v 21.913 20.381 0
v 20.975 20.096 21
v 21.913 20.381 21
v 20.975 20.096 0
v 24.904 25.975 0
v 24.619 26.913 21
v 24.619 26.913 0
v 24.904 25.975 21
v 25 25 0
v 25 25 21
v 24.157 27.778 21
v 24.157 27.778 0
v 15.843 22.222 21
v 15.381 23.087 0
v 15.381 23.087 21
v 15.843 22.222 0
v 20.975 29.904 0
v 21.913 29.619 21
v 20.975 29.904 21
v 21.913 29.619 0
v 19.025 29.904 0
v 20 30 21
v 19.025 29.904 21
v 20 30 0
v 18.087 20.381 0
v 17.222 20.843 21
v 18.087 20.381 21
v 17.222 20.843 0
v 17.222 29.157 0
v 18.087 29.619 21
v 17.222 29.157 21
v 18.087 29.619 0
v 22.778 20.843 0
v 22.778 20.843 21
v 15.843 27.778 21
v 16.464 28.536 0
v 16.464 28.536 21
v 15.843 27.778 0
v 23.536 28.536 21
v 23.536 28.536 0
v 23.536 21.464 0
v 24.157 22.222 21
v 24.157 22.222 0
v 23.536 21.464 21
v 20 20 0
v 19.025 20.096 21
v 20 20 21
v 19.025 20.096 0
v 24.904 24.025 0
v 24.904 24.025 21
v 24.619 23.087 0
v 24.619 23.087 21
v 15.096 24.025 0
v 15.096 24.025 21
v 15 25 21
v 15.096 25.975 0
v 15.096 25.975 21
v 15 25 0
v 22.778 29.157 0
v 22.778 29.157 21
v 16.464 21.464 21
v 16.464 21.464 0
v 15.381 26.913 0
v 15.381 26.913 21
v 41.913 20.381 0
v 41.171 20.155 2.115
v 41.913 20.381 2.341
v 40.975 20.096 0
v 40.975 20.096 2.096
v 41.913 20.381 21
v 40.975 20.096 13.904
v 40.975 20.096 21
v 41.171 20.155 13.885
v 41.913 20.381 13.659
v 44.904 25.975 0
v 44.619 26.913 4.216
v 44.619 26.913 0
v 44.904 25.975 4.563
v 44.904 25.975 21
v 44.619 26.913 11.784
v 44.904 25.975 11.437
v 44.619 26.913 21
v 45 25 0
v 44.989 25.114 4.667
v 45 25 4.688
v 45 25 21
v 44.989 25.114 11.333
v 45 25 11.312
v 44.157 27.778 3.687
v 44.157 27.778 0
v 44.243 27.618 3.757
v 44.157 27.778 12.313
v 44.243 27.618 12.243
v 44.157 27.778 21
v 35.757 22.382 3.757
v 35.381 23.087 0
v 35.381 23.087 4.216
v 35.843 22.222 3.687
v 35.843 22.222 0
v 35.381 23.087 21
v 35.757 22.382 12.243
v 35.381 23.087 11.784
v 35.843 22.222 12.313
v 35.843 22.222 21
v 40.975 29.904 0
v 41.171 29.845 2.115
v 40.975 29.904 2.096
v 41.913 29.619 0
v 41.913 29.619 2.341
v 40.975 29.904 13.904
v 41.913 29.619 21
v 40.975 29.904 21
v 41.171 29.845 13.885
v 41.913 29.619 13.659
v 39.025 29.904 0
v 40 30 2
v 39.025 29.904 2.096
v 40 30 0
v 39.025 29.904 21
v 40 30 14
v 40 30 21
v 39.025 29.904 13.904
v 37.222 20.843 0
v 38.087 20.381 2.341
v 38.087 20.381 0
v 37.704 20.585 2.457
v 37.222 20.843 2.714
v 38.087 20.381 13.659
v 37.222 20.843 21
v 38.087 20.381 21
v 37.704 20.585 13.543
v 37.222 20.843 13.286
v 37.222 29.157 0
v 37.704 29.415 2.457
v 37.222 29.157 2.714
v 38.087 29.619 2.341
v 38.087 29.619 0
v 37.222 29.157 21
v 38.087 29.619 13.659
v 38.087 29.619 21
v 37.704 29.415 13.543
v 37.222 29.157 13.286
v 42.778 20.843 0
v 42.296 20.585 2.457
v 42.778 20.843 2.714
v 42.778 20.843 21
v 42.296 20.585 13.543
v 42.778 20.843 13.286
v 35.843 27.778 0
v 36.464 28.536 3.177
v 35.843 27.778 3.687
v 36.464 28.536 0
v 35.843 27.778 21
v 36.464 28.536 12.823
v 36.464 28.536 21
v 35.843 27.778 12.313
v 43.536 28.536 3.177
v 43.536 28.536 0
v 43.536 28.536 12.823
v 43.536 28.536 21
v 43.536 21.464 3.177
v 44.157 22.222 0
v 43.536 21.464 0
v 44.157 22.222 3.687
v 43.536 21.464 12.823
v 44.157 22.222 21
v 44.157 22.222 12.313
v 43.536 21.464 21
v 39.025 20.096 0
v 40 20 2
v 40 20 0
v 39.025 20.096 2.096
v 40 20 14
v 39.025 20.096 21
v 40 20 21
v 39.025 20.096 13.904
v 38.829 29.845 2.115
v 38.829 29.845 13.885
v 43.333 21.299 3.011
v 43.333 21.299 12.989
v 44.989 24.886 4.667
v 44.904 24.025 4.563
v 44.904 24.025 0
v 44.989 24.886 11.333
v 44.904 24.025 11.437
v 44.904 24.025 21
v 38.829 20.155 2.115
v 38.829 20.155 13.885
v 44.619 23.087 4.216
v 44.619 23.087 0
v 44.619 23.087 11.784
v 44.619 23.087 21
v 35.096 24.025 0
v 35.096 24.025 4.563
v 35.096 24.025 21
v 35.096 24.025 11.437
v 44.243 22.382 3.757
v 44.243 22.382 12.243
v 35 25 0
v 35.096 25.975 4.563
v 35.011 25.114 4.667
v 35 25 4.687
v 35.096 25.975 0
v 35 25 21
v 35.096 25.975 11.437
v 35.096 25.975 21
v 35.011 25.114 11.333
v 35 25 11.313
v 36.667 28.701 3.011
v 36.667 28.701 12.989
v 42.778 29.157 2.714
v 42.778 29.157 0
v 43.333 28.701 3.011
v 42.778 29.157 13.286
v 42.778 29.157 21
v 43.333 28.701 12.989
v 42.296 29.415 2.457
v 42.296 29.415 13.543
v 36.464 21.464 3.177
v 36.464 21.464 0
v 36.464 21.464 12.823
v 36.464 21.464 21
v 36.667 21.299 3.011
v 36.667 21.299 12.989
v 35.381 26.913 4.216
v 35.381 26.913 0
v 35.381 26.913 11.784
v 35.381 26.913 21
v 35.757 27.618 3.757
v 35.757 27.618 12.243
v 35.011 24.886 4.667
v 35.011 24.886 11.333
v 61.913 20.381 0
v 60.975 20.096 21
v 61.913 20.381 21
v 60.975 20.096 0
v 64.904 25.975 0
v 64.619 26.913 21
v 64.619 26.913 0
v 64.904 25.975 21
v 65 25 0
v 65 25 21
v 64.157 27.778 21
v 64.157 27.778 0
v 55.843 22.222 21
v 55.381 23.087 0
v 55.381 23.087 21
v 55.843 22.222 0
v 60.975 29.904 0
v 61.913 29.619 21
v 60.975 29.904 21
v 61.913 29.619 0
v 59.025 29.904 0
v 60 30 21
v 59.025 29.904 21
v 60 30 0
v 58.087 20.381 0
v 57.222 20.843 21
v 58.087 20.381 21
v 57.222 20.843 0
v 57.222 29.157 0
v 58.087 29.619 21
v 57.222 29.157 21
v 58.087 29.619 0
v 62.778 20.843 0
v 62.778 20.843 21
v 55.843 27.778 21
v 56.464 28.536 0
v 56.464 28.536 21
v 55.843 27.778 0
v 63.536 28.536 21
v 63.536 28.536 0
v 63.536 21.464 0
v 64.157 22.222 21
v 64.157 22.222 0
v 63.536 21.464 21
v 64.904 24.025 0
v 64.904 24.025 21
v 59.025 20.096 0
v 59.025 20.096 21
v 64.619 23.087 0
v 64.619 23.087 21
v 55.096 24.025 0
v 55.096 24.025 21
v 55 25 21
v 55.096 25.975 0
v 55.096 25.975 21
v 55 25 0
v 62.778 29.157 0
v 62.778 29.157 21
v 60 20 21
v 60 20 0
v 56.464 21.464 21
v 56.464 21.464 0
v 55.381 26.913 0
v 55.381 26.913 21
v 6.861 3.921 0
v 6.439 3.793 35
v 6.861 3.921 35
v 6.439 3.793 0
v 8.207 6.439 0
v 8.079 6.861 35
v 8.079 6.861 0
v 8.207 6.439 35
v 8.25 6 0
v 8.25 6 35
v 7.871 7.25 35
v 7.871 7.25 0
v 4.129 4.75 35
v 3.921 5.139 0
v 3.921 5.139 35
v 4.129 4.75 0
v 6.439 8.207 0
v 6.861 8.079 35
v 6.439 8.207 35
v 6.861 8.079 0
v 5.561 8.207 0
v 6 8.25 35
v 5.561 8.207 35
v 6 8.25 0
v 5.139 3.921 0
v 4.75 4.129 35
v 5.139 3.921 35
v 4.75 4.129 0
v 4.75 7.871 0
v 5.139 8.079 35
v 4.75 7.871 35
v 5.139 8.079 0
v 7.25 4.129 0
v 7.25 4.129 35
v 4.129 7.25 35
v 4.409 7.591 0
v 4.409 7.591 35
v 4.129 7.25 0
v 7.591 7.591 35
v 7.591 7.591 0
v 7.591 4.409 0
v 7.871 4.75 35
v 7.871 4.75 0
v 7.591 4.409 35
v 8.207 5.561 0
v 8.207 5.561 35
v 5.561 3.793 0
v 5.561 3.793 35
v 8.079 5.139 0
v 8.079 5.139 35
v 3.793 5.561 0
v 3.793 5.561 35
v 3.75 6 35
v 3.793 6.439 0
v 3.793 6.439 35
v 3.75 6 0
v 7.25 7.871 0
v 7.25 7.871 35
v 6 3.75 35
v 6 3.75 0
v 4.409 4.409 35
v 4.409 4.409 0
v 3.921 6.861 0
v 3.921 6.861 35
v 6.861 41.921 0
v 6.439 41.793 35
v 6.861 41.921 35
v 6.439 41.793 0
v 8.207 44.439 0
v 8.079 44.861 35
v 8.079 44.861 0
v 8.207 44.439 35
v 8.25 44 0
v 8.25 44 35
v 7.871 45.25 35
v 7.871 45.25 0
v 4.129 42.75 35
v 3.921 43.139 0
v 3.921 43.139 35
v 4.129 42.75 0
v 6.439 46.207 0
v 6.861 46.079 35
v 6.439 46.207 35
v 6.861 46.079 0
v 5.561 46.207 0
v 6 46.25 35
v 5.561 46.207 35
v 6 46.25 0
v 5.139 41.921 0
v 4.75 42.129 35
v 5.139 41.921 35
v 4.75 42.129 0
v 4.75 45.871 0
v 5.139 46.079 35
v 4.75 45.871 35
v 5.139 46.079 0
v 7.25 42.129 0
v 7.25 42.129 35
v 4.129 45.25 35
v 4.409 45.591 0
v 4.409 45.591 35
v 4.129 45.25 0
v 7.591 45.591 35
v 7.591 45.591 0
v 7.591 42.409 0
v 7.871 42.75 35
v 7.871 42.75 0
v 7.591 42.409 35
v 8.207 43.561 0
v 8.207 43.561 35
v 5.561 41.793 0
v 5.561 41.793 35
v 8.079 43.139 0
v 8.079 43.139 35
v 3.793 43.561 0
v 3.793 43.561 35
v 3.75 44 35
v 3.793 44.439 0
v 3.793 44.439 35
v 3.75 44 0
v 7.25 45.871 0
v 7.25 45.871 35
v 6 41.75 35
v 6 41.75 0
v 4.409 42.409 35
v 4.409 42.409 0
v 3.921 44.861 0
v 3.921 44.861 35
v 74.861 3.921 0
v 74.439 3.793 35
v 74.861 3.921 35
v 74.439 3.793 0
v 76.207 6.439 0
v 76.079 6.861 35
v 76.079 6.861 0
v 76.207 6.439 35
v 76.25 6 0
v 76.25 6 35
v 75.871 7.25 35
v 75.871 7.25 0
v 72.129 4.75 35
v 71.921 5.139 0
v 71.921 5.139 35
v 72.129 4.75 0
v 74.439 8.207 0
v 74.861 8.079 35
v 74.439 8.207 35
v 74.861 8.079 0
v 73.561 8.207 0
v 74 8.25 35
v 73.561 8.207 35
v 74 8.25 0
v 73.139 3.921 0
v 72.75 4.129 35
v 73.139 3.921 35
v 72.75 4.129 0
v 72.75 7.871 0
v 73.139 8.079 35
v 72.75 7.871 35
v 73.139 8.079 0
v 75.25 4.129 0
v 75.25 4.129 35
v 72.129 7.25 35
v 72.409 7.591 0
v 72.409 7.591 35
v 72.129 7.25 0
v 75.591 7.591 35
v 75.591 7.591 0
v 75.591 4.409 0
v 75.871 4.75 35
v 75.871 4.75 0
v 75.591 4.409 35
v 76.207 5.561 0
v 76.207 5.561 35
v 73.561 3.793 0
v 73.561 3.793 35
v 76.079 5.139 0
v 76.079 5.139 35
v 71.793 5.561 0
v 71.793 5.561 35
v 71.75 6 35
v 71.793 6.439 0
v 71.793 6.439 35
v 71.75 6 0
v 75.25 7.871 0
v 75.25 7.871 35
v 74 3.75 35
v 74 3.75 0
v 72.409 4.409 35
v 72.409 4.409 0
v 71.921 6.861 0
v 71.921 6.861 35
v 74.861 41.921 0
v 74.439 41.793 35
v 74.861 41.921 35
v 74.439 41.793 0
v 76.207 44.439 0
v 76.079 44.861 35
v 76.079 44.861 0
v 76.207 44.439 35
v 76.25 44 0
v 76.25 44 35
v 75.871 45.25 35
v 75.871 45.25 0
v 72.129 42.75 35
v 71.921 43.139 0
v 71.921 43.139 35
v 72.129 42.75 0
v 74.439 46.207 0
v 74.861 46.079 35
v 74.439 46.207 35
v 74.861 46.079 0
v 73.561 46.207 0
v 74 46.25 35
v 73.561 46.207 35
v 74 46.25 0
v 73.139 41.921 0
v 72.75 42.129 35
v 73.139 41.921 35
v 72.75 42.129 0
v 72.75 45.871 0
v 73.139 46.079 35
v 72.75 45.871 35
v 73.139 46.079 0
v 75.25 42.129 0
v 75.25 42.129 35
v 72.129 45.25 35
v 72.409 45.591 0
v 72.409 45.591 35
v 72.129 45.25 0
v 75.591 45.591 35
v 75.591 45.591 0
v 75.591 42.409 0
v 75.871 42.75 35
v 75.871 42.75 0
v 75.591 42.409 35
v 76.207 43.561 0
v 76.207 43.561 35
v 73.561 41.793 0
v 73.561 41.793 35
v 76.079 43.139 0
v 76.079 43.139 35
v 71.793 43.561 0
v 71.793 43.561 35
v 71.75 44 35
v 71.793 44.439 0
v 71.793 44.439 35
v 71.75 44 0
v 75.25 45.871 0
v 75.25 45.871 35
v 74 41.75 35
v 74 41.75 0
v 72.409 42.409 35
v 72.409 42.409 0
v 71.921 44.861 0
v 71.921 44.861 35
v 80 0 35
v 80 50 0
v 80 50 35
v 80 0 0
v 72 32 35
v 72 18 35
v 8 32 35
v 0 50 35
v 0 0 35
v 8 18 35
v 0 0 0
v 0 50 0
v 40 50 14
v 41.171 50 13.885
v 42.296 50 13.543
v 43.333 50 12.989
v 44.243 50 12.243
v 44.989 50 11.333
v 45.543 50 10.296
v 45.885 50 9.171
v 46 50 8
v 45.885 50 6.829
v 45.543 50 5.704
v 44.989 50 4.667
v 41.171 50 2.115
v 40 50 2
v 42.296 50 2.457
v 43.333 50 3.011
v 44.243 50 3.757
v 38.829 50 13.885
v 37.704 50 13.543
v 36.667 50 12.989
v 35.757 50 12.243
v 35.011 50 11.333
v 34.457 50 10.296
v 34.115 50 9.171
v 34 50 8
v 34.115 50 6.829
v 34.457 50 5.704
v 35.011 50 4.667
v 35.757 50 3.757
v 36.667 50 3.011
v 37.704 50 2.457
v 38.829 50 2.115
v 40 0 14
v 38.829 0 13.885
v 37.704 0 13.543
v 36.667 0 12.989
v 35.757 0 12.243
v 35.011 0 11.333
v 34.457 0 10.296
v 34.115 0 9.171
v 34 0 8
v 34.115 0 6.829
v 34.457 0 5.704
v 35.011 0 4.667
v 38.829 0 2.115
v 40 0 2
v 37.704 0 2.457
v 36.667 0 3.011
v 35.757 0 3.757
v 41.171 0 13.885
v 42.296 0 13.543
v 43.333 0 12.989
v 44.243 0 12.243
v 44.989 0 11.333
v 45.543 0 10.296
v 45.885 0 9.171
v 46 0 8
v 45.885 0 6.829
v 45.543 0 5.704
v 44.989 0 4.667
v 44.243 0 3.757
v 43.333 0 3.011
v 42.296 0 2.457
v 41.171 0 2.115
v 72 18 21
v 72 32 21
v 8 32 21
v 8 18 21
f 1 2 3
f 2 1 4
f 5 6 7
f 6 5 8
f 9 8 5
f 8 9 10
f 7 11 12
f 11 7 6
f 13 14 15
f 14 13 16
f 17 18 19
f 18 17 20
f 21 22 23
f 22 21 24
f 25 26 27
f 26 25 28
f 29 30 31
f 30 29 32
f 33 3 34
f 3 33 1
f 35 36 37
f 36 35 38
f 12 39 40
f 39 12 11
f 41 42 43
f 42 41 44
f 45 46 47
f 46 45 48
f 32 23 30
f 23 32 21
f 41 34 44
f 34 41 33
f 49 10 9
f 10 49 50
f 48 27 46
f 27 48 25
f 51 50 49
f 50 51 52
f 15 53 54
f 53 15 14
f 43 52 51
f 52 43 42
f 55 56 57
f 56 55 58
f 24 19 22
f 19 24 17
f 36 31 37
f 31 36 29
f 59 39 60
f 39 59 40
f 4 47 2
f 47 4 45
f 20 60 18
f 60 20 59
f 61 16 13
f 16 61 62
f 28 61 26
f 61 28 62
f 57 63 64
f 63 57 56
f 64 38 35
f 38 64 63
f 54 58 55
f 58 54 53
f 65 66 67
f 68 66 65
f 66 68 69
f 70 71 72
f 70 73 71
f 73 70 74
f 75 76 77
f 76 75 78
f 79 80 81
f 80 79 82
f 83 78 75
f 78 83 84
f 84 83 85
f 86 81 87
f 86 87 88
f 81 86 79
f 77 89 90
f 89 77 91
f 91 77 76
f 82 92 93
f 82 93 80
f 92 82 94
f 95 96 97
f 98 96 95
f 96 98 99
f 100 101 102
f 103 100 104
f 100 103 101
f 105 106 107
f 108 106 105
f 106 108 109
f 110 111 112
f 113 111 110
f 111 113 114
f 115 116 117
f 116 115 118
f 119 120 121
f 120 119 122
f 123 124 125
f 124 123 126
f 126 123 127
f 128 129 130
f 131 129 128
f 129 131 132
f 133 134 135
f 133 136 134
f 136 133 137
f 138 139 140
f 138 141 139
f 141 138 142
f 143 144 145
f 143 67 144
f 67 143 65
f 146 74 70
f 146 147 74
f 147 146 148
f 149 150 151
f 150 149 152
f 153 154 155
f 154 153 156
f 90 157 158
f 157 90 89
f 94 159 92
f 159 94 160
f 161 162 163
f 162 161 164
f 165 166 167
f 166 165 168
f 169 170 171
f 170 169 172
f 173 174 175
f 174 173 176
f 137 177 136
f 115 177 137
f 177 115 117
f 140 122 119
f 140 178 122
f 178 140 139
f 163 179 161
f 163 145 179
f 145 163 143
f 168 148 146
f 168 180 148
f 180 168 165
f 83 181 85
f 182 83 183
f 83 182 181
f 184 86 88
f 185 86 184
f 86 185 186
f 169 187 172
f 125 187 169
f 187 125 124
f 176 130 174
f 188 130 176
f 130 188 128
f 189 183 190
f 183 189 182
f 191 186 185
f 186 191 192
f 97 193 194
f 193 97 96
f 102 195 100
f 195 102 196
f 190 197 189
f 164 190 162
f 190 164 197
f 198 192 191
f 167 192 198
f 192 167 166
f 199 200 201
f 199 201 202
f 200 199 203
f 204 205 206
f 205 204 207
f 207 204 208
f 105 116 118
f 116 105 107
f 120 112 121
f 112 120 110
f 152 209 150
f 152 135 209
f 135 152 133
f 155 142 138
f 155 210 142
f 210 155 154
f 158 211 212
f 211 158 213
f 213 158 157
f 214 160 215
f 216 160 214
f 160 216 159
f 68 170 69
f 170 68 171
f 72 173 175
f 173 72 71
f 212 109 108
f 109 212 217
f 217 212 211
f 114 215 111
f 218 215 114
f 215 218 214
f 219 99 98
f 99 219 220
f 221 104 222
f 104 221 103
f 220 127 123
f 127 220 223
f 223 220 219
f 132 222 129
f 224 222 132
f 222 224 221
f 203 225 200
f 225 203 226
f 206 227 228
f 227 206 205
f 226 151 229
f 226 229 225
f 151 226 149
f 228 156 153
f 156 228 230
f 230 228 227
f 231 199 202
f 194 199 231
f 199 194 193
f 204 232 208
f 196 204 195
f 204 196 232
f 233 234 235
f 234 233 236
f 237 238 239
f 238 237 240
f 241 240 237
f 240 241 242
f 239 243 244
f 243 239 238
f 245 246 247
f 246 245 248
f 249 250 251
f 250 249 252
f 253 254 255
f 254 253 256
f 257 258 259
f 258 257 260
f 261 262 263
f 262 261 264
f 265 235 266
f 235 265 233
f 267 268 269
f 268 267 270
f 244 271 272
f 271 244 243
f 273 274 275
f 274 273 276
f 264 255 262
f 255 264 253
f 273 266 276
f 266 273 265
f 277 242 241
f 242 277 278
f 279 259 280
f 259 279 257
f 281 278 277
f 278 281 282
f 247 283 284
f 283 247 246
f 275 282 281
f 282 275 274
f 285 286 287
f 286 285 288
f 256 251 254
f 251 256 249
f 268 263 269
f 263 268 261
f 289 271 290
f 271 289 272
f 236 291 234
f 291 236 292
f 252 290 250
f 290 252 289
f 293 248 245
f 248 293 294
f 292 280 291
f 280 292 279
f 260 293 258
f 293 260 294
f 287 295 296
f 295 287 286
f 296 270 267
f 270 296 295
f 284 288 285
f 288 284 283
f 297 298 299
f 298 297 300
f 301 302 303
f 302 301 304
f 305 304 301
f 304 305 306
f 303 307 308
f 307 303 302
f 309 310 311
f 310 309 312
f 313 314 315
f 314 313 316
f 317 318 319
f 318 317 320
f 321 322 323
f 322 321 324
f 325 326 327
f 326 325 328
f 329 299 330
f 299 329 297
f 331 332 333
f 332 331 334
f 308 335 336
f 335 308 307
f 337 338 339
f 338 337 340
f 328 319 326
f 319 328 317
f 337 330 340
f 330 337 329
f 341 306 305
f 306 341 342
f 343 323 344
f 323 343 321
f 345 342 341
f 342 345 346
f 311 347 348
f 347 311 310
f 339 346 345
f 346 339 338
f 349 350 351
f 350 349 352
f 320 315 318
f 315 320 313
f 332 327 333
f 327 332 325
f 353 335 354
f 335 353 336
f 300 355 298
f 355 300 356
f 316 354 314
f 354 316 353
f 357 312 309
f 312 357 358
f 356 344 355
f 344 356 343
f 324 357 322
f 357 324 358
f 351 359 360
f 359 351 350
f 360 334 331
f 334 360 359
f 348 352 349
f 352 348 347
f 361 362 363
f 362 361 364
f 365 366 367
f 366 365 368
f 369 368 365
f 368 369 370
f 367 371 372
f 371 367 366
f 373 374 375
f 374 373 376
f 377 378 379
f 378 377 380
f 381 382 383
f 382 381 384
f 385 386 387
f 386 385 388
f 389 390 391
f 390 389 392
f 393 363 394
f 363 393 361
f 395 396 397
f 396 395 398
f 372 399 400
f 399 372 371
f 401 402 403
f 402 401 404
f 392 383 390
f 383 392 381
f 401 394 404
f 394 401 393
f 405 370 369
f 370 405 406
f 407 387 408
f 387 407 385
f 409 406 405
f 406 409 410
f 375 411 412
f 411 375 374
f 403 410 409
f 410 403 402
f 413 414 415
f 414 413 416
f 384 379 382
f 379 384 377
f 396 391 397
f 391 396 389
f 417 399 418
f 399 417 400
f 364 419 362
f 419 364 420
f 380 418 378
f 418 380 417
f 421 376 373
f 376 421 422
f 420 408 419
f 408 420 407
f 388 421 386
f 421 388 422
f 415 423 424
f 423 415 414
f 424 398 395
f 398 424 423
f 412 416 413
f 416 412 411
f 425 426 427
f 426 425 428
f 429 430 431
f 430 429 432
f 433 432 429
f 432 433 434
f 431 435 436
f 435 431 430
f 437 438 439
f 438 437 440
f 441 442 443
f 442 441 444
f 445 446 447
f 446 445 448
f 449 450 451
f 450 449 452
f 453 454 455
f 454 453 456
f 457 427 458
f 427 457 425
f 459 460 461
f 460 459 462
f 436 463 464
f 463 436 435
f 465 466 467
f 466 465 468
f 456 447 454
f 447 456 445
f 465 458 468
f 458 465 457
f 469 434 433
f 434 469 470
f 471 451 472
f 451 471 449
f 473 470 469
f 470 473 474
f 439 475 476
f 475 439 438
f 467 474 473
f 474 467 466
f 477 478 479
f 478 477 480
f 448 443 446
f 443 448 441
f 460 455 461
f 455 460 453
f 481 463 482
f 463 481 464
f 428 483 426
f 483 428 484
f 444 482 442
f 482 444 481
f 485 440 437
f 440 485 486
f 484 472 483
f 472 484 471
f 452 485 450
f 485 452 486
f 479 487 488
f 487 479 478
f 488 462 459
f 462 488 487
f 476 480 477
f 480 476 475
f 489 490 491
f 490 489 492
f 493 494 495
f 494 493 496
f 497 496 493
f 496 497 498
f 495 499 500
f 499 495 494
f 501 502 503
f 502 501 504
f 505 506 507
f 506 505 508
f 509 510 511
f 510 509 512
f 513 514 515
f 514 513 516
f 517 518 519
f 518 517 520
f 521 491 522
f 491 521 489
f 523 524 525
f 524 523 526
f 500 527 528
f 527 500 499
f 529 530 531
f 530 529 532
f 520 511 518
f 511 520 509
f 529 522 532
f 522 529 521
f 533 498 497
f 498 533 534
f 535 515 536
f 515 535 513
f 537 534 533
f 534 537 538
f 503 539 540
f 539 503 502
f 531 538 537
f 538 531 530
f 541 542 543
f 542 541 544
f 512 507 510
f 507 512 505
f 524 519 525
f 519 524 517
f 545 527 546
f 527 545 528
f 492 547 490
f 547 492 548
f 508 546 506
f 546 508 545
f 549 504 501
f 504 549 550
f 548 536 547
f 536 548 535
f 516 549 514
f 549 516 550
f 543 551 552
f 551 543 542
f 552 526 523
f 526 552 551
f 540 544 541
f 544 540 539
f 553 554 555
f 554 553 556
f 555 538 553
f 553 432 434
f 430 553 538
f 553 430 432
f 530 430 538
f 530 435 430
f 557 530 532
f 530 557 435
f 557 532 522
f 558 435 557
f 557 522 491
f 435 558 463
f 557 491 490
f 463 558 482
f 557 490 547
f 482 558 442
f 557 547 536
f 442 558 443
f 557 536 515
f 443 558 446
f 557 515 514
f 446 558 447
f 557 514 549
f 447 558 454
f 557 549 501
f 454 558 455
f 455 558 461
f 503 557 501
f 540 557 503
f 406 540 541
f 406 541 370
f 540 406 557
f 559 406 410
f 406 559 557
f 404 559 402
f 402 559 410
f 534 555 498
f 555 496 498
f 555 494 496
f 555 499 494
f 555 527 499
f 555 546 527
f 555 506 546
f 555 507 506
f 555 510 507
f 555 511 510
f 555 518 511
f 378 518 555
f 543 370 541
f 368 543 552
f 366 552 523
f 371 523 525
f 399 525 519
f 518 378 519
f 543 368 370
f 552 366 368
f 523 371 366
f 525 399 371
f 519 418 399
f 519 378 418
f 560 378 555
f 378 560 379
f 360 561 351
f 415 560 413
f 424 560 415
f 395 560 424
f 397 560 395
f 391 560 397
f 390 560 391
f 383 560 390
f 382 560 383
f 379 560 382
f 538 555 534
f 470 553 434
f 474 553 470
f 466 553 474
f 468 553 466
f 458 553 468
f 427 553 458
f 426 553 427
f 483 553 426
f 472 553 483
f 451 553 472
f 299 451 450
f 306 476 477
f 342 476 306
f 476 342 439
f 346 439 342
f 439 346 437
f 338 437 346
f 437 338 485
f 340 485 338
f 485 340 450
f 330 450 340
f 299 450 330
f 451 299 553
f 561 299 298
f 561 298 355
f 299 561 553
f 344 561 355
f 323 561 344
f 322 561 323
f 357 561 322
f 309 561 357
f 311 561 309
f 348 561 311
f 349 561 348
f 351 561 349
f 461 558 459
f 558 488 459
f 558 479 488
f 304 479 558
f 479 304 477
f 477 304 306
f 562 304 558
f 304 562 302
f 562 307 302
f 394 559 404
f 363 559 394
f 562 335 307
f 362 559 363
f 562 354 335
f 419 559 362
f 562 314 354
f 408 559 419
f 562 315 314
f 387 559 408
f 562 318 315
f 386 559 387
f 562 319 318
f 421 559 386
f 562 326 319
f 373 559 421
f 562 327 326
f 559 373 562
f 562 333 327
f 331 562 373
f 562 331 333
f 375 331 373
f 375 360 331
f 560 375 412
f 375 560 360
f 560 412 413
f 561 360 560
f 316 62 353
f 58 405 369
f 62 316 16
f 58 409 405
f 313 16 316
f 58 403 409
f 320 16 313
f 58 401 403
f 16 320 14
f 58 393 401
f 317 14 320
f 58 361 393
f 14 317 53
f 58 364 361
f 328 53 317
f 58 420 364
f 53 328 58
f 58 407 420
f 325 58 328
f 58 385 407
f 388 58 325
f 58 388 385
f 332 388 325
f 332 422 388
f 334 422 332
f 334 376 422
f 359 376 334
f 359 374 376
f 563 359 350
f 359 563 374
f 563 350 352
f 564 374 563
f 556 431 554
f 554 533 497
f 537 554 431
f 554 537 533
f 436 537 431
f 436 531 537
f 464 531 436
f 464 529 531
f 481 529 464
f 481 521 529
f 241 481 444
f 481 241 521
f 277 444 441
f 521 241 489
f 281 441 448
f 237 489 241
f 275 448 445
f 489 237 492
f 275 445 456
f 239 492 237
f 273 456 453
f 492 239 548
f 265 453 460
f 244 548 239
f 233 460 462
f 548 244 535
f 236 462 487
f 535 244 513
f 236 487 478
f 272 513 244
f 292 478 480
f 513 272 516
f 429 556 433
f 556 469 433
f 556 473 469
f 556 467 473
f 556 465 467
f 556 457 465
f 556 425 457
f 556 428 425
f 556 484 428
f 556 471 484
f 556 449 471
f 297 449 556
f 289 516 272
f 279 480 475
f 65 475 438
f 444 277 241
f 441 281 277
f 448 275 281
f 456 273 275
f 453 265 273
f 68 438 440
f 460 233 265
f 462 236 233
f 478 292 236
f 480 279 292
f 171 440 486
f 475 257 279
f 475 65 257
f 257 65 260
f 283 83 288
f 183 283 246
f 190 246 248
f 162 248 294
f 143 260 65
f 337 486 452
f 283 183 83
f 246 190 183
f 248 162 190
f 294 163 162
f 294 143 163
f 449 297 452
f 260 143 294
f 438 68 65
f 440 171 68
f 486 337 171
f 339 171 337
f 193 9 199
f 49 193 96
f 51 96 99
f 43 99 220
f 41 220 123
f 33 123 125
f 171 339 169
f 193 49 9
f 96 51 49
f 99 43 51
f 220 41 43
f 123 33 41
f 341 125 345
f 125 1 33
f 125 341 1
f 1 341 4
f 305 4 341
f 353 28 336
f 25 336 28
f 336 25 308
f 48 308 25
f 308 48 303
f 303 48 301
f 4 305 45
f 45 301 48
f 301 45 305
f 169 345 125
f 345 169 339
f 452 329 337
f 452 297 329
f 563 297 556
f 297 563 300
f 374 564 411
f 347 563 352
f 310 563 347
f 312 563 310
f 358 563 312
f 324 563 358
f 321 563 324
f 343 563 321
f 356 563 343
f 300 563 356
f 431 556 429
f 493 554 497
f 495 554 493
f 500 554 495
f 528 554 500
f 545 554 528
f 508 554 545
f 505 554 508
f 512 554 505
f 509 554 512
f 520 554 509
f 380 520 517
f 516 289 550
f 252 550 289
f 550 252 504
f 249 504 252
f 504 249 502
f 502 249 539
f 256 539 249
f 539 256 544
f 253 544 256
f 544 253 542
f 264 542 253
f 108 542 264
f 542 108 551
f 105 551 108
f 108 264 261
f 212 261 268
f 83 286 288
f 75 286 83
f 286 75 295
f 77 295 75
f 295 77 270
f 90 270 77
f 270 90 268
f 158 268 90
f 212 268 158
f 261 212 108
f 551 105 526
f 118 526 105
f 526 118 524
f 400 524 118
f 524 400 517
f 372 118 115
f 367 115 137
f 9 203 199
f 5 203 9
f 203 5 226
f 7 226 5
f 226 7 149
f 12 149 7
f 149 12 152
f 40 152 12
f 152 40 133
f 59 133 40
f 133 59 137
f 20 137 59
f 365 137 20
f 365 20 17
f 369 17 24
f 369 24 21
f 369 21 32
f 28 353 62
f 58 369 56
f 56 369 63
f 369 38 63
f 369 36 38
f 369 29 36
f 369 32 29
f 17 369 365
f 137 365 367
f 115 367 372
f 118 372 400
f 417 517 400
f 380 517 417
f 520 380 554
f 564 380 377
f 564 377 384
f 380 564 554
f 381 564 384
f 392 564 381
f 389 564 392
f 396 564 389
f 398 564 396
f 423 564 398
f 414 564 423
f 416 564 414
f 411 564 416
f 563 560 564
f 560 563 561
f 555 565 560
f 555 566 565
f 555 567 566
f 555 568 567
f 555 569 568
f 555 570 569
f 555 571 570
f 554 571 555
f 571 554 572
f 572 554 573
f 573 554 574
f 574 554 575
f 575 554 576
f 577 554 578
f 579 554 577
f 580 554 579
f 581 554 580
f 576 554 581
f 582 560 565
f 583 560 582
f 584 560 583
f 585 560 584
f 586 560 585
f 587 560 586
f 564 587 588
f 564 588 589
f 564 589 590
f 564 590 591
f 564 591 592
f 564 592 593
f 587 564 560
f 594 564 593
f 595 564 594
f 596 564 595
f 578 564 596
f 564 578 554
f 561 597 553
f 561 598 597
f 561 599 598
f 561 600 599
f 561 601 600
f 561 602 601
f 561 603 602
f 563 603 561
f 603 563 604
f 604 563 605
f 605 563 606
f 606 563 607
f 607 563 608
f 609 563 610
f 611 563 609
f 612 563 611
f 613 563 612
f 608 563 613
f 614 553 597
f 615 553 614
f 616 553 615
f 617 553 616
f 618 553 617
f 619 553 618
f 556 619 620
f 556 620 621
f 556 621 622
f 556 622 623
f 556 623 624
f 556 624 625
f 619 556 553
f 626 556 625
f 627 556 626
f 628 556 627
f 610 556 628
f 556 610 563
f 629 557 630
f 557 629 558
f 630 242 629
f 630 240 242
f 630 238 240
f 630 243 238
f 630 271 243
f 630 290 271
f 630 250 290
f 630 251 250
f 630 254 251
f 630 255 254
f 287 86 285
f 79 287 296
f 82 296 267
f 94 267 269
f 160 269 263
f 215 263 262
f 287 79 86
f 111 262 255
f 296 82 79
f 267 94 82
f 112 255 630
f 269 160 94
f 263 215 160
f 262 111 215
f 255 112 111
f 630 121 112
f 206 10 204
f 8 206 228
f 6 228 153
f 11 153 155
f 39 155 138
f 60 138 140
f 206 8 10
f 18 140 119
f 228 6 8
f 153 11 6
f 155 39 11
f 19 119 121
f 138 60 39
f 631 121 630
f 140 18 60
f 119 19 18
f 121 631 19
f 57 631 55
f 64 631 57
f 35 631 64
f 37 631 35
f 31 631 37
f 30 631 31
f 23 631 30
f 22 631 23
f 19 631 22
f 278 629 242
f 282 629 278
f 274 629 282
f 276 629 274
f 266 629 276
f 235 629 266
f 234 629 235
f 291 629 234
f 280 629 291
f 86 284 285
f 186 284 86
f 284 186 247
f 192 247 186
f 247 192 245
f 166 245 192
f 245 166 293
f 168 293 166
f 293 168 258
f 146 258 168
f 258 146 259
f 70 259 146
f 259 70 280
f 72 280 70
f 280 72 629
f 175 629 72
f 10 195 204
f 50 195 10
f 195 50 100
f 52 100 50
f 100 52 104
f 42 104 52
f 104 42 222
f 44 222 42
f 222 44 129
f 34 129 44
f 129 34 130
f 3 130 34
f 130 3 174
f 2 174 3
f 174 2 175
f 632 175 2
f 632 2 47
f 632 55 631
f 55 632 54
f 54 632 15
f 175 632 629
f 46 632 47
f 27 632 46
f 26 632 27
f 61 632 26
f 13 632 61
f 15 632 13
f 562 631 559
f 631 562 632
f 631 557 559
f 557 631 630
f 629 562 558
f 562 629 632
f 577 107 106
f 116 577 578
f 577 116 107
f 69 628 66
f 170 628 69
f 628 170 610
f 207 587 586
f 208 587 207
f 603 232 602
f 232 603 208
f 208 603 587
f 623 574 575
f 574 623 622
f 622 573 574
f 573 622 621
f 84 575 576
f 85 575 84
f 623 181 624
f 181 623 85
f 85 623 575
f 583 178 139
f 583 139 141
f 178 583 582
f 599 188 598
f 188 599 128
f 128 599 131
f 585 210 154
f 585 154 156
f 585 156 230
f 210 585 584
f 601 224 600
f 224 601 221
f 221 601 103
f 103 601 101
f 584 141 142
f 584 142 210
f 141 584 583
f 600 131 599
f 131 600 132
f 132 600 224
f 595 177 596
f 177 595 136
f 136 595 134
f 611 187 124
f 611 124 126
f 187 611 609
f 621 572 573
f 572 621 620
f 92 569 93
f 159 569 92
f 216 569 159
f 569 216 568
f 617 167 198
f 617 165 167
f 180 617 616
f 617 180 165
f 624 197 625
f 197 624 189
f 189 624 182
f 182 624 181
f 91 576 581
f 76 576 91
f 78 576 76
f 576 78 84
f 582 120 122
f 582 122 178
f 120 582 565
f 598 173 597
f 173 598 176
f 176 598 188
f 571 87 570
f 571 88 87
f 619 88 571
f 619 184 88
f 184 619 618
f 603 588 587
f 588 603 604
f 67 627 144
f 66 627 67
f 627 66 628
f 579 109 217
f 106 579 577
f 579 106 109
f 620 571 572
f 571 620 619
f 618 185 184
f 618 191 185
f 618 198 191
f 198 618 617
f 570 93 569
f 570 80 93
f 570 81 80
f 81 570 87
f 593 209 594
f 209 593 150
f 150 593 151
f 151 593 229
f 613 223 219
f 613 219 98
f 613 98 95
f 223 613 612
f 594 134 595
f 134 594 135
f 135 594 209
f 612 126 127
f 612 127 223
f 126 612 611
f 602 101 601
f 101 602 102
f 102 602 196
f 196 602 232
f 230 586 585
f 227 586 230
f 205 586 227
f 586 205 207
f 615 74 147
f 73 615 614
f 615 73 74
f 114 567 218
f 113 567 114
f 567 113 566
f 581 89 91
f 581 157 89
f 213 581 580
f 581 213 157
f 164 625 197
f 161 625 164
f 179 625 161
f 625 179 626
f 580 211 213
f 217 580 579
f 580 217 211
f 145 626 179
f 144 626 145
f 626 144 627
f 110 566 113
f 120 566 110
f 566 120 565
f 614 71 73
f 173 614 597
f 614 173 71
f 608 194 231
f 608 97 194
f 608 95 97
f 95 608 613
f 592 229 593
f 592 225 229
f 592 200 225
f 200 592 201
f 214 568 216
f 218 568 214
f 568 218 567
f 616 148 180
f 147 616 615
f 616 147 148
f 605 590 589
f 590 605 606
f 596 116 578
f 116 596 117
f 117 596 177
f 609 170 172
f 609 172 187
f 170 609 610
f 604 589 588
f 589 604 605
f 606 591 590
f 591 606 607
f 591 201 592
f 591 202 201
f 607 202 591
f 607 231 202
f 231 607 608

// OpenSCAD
$fn = 32;

// ----------------------------------------------------------------------
// Manifold block: side_outlet manifold
// ----------------------------------------------------------------------

// --- parameters (mm) ---
block_l = 80;             // block length, X
block_w = 50;             // block width, Y
block_h = 35;             // block height, Z
port_d = 10;              // port bore diameter
port_pitch = 20;          // port pitch along X
gallery_d = 14;           // top gallery width, Y
gallery_depth = 14;       // gallery pocket depth
wall_p = 8;               // gallery end wall thickness, X
mnt_d = 4.5;              // mounting hole diameter
mnt_in = 6;               // mounting hole inset from the edges
out_d = 12;               // outlet bore diameter
out_z = 8;                // outlet axis height

n_ports = 3;  // ports in the row
port_x0 = (block_l - (n_ports - 1) * port_pitch) / 2;  // first port X

difference() {
  cube([block_l, block_w, block_h]);
  for (i = [0 : n_ports - 1])
    translate([port_x0 + i * port_pitch, block_w / 2, -1])
      cylinder(h = block_h + 2, d = port_d);
  translate([wall_p, block_w / 2 - gallery_d / 2, block_h - gallery_depth])
    cube([block_l - 2 * wall_p, gallery_d, gallery_depth + 1]);
  for (cx = [mnt_in, block_l - mnt_in])
    for (cy = [mnt_in, block_w - mnt_in])
      translate([cx, cy, -1]) cylinder(h = block_h + 2, d = mnt_d);
  translate([block_l / 2, -1, out_z]) rotate([-90, 0, 0])
    cylinder(h = block_w + 2, d = out_d);
}
